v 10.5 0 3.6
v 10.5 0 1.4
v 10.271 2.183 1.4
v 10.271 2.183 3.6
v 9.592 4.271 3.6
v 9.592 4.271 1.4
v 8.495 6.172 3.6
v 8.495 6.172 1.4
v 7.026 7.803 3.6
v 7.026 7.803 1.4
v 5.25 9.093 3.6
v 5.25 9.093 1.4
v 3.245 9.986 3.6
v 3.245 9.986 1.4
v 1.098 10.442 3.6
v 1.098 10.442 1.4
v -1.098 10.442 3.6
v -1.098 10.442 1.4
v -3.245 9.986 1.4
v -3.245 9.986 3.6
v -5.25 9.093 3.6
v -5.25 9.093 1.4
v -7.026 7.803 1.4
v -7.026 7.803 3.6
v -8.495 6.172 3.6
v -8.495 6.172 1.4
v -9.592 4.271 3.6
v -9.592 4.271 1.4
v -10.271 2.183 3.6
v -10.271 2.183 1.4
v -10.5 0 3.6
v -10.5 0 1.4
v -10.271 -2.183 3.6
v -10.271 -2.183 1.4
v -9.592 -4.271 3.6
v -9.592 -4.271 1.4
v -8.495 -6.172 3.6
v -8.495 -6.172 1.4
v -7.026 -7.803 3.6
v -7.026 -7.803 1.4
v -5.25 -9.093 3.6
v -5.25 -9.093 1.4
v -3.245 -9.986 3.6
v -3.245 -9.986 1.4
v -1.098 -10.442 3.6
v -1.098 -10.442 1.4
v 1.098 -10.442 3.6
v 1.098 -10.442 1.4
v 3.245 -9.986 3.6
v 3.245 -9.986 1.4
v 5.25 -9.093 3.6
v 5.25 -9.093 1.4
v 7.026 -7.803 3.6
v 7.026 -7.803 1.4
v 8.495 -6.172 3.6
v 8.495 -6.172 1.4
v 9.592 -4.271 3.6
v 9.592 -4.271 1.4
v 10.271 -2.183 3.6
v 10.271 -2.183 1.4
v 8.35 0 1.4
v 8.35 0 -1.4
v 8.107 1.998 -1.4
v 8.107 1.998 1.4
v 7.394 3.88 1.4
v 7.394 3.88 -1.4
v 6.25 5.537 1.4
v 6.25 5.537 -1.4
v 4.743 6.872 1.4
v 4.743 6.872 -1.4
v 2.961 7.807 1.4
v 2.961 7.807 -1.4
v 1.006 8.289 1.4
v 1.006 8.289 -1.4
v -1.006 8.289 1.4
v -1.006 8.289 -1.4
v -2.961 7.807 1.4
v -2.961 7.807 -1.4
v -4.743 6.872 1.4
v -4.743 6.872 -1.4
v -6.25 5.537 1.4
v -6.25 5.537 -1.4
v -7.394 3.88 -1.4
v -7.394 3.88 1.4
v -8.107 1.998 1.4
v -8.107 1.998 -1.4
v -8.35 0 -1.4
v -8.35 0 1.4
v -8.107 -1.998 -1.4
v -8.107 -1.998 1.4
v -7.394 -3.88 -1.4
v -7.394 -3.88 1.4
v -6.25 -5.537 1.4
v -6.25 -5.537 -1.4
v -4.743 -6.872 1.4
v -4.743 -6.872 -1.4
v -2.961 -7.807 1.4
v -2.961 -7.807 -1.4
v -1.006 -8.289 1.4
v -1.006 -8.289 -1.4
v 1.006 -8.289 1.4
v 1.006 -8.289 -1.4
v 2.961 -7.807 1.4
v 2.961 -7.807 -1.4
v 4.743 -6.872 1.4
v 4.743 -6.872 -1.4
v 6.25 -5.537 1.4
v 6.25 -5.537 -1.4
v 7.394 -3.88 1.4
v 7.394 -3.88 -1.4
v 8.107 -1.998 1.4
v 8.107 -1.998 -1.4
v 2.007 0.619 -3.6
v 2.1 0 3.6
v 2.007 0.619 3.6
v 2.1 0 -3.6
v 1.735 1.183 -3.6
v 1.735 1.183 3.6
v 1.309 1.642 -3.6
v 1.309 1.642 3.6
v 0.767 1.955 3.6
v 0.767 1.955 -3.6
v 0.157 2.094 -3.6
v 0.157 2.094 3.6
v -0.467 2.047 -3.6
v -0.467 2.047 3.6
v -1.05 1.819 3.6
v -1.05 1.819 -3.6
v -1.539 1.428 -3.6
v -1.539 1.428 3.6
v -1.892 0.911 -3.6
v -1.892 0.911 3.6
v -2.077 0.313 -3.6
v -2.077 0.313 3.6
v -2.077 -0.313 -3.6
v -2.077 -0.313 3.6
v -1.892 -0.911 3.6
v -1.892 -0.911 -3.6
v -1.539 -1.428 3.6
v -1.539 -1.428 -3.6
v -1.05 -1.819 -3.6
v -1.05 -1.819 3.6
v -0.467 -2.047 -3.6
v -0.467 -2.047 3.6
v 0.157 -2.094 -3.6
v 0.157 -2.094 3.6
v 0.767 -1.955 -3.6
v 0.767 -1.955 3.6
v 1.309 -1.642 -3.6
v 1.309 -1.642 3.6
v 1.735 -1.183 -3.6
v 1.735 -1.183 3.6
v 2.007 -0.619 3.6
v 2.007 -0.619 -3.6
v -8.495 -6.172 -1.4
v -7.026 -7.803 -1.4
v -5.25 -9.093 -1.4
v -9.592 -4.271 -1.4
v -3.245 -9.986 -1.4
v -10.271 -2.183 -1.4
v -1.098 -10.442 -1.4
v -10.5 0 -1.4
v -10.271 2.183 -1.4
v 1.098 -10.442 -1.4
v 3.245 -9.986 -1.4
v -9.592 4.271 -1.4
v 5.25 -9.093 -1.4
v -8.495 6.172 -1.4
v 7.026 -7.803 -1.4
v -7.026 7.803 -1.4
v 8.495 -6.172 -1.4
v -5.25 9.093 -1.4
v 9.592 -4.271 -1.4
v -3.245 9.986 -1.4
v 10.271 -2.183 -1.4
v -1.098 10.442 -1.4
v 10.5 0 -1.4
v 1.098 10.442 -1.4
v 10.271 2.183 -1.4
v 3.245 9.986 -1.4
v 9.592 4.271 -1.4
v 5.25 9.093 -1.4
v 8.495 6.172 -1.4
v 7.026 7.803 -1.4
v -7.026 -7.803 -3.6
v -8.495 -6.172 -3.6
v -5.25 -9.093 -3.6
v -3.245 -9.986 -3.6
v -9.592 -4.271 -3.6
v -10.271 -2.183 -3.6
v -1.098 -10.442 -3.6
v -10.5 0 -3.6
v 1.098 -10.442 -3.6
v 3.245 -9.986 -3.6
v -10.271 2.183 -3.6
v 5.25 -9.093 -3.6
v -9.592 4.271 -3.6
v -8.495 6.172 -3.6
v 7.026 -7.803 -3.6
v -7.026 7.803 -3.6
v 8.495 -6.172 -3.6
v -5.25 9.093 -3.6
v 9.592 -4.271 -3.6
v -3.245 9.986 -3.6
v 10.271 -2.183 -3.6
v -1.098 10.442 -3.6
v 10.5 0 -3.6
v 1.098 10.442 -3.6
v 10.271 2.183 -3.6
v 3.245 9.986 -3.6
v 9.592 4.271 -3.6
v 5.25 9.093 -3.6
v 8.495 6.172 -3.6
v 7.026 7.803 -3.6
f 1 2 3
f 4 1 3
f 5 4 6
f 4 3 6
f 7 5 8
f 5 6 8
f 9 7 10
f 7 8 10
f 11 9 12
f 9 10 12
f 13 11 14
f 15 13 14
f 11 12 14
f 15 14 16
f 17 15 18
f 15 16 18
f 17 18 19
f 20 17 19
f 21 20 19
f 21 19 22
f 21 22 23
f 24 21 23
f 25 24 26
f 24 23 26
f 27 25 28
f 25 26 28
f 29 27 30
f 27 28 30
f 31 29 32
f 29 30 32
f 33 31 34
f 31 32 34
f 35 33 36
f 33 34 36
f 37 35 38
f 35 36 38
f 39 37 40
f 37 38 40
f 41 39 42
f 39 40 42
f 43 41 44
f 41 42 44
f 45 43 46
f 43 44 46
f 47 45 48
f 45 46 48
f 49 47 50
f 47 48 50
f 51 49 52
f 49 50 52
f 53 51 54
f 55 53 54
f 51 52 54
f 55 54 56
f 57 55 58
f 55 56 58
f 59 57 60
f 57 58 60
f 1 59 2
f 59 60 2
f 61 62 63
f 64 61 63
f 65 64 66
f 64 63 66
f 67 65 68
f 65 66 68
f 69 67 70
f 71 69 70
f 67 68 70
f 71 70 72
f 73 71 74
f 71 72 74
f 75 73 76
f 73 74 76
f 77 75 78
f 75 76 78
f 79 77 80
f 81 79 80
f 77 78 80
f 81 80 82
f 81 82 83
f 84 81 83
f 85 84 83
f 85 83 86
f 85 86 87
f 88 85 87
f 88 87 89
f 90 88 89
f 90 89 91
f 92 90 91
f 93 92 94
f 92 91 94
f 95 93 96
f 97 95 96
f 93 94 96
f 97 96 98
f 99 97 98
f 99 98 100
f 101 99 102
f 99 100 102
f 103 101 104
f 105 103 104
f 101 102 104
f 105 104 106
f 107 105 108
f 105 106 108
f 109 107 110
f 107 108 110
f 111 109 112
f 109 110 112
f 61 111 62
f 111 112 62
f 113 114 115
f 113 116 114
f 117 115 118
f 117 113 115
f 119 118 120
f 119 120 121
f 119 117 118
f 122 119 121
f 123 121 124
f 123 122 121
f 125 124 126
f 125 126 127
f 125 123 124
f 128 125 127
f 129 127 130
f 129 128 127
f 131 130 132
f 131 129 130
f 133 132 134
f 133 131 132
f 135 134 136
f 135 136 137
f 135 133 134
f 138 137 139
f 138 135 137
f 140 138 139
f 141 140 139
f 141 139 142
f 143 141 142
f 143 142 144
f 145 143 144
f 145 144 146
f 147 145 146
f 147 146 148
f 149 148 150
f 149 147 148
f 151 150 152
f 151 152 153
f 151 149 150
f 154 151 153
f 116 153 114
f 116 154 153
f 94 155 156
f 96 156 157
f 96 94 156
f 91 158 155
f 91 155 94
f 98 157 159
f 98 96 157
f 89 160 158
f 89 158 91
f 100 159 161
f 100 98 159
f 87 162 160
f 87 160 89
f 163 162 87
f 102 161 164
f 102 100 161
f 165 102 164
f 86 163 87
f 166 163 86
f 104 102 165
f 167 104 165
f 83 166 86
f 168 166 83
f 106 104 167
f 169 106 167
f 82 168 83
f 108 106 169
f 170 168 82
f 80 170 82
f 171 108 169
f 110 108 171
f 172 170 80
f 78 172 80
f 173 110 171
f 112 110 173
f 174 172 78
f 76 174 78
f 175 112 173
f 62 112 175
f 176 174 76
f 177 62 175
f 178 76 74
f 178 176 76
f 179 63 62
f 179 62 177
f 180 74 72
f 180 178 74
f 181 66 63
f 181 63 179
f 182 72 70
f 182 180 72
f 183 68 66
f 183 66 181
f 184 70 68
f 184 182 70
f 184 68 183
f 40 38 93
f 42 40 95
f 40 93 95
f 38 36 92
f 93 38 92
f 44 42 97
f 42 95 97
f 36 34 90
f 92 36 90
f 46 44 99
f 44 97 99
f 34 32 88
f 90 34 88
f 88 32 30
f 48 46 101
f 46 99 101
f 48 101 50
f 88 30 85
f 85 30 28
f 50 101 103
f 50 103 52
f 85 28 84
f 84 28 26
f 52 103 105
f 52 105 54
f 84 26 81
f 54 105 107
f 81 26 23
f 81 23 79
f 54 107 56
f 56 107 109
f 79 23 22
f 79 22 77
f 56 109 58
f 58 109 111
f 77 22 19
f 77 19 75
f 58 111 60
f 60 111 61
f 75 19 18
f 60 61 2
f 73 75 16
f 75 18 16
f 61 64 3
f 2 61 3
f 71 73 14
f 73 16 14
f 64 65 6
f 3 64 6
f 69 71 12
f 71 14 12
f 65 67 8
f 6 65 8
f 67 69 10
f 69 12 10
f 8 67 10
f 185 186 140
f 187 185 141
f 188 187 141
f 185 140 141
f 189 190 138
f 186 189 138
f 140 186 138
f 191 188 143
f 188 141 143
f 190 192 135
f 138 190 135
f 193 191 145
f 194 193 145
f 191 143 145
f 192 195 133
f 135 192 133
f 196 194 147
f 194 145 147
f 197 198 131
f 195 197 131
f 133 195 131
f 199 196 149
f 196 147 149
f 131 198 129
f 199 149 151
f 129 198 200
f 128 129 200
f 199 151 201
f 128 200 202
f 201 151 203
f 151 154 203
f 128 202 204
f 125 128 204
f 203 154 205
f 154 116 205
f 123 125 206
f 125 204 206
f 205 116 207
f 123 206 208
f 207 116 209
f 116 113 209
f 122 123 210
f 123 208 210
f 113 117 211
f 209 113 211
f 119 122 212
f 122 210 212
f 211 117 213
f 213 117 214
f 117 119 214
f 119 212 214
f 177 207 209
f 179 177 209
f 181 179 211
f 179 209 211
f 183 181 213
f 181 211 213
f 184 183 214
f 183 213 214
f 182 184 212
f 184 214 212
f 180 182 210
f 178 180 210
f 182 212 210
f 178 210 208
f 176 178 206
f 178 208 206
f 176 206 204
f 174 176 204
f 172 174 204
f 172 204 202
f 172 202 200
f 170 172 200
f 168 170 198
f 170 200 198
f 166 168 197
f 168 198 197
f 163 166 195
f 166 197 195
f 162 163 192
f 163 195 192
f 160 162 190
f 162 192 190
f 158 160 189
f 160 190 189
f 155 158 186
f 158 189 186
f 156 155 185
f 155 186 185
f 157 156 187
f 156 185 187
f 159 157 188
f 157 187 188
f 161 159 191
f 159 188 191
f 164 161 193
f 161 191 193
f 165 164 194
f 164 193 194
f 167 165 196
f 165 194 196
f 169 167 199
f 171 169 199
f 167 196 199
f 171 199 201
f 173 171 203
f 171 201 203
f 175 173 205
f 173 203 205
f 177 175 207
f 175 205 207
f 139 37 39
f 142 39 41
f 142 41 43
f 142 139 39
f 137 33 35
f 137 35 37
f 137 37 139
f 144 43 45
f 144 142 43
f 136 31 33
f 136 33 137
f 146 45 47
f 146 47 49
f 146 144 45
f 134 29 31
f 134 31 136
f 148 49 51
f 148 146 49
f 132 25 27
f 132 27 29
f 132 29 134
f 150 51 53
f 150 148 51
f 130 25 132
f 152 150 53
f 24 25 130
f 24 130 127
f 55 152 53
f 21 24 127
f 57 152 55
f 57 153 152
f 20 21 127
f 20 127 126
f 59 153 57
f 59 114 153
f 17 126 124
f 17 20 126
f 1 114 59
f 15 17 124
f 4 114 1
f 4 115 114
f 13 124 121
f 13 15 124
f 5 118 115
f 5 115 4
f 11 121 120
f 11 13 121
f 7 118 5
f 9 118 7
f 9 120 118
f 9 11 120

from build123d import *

# Parameters (mm, degrees)
F_01_START                           = -1.4
S01_GROOVE_ROOT_AND_AXLE_BORE_R      = 8.35
S01_GROOVE_ROOT_AND_AXLE_BORE_R_2    = 2.1
F_01_GROOVE_ROOT_AND_AXLE_BORE_DEPTH = 2.8
F_02_START                           = -3.6
S02_RETAINING_FLANGE_3_6_R           = 10.5
S02_RETAINING_FLANGE_3_6_R_2         = 2.1
F_02_RETAINING_FLANGE_3_6_DEPTH      = 2.2
F_03_START                           = 1.4
S03_RETAINING_FLANGE_1_4_R           = 10.5
S03_RETAINING_FLANGE_1_4_R_2         = 2.1
F_03_RETAINING_FLANGE_1_4_DEPTH      = 2.2


with BuildPart() as part:
    # S01 - Groove root and axle bore → 01 - Groove root and axle bore (new body)
    with BuildSketch(Plane.XY.offset(F_01_START)):
        Circle(S01_GROOVE_ROOT_AND_AXLE_BORE_R)
        Circle(S01_GROOVE_ROOT_AND_AXLE_BORE_R_2, mode=Mode.SUBTRACT)
    extrude(amount=F_01_GROOVE_ROOT_AND_AXLE_BORE_DEPTH)

    # S02 - Retaining flange -3.6 → 02 - Retaining flange -3.6 (add)
    with BuildSketch(Plane.XY.offset(F_02_START)):
        Circle(S02_RETAINING_FLANGE_3_6_R)
        Circle(S02_RETAINING_FLANGE_3_6_R_2, mode=Mode.SUBTRACT)
    extrude(amount=F_02_RETAINING_FLANGE_3_6_DEPTH)

    # S03 - Retaining flange 1.4 → 03 - Retaining flange 1.4 (add)
    with BuildSketch(Plane.XY.offset(F_03_START)):
        Circle(S03_RETAINING_FLANGE_1_4_R)
        Circle(S03_RETAINING_FLANGE_1_4_R_2, mode=Mode.SUBTRACT)
    extrude(amount=F_03_RETAINING_FLANGE_1_4_DEPTH)


solid = part.part
